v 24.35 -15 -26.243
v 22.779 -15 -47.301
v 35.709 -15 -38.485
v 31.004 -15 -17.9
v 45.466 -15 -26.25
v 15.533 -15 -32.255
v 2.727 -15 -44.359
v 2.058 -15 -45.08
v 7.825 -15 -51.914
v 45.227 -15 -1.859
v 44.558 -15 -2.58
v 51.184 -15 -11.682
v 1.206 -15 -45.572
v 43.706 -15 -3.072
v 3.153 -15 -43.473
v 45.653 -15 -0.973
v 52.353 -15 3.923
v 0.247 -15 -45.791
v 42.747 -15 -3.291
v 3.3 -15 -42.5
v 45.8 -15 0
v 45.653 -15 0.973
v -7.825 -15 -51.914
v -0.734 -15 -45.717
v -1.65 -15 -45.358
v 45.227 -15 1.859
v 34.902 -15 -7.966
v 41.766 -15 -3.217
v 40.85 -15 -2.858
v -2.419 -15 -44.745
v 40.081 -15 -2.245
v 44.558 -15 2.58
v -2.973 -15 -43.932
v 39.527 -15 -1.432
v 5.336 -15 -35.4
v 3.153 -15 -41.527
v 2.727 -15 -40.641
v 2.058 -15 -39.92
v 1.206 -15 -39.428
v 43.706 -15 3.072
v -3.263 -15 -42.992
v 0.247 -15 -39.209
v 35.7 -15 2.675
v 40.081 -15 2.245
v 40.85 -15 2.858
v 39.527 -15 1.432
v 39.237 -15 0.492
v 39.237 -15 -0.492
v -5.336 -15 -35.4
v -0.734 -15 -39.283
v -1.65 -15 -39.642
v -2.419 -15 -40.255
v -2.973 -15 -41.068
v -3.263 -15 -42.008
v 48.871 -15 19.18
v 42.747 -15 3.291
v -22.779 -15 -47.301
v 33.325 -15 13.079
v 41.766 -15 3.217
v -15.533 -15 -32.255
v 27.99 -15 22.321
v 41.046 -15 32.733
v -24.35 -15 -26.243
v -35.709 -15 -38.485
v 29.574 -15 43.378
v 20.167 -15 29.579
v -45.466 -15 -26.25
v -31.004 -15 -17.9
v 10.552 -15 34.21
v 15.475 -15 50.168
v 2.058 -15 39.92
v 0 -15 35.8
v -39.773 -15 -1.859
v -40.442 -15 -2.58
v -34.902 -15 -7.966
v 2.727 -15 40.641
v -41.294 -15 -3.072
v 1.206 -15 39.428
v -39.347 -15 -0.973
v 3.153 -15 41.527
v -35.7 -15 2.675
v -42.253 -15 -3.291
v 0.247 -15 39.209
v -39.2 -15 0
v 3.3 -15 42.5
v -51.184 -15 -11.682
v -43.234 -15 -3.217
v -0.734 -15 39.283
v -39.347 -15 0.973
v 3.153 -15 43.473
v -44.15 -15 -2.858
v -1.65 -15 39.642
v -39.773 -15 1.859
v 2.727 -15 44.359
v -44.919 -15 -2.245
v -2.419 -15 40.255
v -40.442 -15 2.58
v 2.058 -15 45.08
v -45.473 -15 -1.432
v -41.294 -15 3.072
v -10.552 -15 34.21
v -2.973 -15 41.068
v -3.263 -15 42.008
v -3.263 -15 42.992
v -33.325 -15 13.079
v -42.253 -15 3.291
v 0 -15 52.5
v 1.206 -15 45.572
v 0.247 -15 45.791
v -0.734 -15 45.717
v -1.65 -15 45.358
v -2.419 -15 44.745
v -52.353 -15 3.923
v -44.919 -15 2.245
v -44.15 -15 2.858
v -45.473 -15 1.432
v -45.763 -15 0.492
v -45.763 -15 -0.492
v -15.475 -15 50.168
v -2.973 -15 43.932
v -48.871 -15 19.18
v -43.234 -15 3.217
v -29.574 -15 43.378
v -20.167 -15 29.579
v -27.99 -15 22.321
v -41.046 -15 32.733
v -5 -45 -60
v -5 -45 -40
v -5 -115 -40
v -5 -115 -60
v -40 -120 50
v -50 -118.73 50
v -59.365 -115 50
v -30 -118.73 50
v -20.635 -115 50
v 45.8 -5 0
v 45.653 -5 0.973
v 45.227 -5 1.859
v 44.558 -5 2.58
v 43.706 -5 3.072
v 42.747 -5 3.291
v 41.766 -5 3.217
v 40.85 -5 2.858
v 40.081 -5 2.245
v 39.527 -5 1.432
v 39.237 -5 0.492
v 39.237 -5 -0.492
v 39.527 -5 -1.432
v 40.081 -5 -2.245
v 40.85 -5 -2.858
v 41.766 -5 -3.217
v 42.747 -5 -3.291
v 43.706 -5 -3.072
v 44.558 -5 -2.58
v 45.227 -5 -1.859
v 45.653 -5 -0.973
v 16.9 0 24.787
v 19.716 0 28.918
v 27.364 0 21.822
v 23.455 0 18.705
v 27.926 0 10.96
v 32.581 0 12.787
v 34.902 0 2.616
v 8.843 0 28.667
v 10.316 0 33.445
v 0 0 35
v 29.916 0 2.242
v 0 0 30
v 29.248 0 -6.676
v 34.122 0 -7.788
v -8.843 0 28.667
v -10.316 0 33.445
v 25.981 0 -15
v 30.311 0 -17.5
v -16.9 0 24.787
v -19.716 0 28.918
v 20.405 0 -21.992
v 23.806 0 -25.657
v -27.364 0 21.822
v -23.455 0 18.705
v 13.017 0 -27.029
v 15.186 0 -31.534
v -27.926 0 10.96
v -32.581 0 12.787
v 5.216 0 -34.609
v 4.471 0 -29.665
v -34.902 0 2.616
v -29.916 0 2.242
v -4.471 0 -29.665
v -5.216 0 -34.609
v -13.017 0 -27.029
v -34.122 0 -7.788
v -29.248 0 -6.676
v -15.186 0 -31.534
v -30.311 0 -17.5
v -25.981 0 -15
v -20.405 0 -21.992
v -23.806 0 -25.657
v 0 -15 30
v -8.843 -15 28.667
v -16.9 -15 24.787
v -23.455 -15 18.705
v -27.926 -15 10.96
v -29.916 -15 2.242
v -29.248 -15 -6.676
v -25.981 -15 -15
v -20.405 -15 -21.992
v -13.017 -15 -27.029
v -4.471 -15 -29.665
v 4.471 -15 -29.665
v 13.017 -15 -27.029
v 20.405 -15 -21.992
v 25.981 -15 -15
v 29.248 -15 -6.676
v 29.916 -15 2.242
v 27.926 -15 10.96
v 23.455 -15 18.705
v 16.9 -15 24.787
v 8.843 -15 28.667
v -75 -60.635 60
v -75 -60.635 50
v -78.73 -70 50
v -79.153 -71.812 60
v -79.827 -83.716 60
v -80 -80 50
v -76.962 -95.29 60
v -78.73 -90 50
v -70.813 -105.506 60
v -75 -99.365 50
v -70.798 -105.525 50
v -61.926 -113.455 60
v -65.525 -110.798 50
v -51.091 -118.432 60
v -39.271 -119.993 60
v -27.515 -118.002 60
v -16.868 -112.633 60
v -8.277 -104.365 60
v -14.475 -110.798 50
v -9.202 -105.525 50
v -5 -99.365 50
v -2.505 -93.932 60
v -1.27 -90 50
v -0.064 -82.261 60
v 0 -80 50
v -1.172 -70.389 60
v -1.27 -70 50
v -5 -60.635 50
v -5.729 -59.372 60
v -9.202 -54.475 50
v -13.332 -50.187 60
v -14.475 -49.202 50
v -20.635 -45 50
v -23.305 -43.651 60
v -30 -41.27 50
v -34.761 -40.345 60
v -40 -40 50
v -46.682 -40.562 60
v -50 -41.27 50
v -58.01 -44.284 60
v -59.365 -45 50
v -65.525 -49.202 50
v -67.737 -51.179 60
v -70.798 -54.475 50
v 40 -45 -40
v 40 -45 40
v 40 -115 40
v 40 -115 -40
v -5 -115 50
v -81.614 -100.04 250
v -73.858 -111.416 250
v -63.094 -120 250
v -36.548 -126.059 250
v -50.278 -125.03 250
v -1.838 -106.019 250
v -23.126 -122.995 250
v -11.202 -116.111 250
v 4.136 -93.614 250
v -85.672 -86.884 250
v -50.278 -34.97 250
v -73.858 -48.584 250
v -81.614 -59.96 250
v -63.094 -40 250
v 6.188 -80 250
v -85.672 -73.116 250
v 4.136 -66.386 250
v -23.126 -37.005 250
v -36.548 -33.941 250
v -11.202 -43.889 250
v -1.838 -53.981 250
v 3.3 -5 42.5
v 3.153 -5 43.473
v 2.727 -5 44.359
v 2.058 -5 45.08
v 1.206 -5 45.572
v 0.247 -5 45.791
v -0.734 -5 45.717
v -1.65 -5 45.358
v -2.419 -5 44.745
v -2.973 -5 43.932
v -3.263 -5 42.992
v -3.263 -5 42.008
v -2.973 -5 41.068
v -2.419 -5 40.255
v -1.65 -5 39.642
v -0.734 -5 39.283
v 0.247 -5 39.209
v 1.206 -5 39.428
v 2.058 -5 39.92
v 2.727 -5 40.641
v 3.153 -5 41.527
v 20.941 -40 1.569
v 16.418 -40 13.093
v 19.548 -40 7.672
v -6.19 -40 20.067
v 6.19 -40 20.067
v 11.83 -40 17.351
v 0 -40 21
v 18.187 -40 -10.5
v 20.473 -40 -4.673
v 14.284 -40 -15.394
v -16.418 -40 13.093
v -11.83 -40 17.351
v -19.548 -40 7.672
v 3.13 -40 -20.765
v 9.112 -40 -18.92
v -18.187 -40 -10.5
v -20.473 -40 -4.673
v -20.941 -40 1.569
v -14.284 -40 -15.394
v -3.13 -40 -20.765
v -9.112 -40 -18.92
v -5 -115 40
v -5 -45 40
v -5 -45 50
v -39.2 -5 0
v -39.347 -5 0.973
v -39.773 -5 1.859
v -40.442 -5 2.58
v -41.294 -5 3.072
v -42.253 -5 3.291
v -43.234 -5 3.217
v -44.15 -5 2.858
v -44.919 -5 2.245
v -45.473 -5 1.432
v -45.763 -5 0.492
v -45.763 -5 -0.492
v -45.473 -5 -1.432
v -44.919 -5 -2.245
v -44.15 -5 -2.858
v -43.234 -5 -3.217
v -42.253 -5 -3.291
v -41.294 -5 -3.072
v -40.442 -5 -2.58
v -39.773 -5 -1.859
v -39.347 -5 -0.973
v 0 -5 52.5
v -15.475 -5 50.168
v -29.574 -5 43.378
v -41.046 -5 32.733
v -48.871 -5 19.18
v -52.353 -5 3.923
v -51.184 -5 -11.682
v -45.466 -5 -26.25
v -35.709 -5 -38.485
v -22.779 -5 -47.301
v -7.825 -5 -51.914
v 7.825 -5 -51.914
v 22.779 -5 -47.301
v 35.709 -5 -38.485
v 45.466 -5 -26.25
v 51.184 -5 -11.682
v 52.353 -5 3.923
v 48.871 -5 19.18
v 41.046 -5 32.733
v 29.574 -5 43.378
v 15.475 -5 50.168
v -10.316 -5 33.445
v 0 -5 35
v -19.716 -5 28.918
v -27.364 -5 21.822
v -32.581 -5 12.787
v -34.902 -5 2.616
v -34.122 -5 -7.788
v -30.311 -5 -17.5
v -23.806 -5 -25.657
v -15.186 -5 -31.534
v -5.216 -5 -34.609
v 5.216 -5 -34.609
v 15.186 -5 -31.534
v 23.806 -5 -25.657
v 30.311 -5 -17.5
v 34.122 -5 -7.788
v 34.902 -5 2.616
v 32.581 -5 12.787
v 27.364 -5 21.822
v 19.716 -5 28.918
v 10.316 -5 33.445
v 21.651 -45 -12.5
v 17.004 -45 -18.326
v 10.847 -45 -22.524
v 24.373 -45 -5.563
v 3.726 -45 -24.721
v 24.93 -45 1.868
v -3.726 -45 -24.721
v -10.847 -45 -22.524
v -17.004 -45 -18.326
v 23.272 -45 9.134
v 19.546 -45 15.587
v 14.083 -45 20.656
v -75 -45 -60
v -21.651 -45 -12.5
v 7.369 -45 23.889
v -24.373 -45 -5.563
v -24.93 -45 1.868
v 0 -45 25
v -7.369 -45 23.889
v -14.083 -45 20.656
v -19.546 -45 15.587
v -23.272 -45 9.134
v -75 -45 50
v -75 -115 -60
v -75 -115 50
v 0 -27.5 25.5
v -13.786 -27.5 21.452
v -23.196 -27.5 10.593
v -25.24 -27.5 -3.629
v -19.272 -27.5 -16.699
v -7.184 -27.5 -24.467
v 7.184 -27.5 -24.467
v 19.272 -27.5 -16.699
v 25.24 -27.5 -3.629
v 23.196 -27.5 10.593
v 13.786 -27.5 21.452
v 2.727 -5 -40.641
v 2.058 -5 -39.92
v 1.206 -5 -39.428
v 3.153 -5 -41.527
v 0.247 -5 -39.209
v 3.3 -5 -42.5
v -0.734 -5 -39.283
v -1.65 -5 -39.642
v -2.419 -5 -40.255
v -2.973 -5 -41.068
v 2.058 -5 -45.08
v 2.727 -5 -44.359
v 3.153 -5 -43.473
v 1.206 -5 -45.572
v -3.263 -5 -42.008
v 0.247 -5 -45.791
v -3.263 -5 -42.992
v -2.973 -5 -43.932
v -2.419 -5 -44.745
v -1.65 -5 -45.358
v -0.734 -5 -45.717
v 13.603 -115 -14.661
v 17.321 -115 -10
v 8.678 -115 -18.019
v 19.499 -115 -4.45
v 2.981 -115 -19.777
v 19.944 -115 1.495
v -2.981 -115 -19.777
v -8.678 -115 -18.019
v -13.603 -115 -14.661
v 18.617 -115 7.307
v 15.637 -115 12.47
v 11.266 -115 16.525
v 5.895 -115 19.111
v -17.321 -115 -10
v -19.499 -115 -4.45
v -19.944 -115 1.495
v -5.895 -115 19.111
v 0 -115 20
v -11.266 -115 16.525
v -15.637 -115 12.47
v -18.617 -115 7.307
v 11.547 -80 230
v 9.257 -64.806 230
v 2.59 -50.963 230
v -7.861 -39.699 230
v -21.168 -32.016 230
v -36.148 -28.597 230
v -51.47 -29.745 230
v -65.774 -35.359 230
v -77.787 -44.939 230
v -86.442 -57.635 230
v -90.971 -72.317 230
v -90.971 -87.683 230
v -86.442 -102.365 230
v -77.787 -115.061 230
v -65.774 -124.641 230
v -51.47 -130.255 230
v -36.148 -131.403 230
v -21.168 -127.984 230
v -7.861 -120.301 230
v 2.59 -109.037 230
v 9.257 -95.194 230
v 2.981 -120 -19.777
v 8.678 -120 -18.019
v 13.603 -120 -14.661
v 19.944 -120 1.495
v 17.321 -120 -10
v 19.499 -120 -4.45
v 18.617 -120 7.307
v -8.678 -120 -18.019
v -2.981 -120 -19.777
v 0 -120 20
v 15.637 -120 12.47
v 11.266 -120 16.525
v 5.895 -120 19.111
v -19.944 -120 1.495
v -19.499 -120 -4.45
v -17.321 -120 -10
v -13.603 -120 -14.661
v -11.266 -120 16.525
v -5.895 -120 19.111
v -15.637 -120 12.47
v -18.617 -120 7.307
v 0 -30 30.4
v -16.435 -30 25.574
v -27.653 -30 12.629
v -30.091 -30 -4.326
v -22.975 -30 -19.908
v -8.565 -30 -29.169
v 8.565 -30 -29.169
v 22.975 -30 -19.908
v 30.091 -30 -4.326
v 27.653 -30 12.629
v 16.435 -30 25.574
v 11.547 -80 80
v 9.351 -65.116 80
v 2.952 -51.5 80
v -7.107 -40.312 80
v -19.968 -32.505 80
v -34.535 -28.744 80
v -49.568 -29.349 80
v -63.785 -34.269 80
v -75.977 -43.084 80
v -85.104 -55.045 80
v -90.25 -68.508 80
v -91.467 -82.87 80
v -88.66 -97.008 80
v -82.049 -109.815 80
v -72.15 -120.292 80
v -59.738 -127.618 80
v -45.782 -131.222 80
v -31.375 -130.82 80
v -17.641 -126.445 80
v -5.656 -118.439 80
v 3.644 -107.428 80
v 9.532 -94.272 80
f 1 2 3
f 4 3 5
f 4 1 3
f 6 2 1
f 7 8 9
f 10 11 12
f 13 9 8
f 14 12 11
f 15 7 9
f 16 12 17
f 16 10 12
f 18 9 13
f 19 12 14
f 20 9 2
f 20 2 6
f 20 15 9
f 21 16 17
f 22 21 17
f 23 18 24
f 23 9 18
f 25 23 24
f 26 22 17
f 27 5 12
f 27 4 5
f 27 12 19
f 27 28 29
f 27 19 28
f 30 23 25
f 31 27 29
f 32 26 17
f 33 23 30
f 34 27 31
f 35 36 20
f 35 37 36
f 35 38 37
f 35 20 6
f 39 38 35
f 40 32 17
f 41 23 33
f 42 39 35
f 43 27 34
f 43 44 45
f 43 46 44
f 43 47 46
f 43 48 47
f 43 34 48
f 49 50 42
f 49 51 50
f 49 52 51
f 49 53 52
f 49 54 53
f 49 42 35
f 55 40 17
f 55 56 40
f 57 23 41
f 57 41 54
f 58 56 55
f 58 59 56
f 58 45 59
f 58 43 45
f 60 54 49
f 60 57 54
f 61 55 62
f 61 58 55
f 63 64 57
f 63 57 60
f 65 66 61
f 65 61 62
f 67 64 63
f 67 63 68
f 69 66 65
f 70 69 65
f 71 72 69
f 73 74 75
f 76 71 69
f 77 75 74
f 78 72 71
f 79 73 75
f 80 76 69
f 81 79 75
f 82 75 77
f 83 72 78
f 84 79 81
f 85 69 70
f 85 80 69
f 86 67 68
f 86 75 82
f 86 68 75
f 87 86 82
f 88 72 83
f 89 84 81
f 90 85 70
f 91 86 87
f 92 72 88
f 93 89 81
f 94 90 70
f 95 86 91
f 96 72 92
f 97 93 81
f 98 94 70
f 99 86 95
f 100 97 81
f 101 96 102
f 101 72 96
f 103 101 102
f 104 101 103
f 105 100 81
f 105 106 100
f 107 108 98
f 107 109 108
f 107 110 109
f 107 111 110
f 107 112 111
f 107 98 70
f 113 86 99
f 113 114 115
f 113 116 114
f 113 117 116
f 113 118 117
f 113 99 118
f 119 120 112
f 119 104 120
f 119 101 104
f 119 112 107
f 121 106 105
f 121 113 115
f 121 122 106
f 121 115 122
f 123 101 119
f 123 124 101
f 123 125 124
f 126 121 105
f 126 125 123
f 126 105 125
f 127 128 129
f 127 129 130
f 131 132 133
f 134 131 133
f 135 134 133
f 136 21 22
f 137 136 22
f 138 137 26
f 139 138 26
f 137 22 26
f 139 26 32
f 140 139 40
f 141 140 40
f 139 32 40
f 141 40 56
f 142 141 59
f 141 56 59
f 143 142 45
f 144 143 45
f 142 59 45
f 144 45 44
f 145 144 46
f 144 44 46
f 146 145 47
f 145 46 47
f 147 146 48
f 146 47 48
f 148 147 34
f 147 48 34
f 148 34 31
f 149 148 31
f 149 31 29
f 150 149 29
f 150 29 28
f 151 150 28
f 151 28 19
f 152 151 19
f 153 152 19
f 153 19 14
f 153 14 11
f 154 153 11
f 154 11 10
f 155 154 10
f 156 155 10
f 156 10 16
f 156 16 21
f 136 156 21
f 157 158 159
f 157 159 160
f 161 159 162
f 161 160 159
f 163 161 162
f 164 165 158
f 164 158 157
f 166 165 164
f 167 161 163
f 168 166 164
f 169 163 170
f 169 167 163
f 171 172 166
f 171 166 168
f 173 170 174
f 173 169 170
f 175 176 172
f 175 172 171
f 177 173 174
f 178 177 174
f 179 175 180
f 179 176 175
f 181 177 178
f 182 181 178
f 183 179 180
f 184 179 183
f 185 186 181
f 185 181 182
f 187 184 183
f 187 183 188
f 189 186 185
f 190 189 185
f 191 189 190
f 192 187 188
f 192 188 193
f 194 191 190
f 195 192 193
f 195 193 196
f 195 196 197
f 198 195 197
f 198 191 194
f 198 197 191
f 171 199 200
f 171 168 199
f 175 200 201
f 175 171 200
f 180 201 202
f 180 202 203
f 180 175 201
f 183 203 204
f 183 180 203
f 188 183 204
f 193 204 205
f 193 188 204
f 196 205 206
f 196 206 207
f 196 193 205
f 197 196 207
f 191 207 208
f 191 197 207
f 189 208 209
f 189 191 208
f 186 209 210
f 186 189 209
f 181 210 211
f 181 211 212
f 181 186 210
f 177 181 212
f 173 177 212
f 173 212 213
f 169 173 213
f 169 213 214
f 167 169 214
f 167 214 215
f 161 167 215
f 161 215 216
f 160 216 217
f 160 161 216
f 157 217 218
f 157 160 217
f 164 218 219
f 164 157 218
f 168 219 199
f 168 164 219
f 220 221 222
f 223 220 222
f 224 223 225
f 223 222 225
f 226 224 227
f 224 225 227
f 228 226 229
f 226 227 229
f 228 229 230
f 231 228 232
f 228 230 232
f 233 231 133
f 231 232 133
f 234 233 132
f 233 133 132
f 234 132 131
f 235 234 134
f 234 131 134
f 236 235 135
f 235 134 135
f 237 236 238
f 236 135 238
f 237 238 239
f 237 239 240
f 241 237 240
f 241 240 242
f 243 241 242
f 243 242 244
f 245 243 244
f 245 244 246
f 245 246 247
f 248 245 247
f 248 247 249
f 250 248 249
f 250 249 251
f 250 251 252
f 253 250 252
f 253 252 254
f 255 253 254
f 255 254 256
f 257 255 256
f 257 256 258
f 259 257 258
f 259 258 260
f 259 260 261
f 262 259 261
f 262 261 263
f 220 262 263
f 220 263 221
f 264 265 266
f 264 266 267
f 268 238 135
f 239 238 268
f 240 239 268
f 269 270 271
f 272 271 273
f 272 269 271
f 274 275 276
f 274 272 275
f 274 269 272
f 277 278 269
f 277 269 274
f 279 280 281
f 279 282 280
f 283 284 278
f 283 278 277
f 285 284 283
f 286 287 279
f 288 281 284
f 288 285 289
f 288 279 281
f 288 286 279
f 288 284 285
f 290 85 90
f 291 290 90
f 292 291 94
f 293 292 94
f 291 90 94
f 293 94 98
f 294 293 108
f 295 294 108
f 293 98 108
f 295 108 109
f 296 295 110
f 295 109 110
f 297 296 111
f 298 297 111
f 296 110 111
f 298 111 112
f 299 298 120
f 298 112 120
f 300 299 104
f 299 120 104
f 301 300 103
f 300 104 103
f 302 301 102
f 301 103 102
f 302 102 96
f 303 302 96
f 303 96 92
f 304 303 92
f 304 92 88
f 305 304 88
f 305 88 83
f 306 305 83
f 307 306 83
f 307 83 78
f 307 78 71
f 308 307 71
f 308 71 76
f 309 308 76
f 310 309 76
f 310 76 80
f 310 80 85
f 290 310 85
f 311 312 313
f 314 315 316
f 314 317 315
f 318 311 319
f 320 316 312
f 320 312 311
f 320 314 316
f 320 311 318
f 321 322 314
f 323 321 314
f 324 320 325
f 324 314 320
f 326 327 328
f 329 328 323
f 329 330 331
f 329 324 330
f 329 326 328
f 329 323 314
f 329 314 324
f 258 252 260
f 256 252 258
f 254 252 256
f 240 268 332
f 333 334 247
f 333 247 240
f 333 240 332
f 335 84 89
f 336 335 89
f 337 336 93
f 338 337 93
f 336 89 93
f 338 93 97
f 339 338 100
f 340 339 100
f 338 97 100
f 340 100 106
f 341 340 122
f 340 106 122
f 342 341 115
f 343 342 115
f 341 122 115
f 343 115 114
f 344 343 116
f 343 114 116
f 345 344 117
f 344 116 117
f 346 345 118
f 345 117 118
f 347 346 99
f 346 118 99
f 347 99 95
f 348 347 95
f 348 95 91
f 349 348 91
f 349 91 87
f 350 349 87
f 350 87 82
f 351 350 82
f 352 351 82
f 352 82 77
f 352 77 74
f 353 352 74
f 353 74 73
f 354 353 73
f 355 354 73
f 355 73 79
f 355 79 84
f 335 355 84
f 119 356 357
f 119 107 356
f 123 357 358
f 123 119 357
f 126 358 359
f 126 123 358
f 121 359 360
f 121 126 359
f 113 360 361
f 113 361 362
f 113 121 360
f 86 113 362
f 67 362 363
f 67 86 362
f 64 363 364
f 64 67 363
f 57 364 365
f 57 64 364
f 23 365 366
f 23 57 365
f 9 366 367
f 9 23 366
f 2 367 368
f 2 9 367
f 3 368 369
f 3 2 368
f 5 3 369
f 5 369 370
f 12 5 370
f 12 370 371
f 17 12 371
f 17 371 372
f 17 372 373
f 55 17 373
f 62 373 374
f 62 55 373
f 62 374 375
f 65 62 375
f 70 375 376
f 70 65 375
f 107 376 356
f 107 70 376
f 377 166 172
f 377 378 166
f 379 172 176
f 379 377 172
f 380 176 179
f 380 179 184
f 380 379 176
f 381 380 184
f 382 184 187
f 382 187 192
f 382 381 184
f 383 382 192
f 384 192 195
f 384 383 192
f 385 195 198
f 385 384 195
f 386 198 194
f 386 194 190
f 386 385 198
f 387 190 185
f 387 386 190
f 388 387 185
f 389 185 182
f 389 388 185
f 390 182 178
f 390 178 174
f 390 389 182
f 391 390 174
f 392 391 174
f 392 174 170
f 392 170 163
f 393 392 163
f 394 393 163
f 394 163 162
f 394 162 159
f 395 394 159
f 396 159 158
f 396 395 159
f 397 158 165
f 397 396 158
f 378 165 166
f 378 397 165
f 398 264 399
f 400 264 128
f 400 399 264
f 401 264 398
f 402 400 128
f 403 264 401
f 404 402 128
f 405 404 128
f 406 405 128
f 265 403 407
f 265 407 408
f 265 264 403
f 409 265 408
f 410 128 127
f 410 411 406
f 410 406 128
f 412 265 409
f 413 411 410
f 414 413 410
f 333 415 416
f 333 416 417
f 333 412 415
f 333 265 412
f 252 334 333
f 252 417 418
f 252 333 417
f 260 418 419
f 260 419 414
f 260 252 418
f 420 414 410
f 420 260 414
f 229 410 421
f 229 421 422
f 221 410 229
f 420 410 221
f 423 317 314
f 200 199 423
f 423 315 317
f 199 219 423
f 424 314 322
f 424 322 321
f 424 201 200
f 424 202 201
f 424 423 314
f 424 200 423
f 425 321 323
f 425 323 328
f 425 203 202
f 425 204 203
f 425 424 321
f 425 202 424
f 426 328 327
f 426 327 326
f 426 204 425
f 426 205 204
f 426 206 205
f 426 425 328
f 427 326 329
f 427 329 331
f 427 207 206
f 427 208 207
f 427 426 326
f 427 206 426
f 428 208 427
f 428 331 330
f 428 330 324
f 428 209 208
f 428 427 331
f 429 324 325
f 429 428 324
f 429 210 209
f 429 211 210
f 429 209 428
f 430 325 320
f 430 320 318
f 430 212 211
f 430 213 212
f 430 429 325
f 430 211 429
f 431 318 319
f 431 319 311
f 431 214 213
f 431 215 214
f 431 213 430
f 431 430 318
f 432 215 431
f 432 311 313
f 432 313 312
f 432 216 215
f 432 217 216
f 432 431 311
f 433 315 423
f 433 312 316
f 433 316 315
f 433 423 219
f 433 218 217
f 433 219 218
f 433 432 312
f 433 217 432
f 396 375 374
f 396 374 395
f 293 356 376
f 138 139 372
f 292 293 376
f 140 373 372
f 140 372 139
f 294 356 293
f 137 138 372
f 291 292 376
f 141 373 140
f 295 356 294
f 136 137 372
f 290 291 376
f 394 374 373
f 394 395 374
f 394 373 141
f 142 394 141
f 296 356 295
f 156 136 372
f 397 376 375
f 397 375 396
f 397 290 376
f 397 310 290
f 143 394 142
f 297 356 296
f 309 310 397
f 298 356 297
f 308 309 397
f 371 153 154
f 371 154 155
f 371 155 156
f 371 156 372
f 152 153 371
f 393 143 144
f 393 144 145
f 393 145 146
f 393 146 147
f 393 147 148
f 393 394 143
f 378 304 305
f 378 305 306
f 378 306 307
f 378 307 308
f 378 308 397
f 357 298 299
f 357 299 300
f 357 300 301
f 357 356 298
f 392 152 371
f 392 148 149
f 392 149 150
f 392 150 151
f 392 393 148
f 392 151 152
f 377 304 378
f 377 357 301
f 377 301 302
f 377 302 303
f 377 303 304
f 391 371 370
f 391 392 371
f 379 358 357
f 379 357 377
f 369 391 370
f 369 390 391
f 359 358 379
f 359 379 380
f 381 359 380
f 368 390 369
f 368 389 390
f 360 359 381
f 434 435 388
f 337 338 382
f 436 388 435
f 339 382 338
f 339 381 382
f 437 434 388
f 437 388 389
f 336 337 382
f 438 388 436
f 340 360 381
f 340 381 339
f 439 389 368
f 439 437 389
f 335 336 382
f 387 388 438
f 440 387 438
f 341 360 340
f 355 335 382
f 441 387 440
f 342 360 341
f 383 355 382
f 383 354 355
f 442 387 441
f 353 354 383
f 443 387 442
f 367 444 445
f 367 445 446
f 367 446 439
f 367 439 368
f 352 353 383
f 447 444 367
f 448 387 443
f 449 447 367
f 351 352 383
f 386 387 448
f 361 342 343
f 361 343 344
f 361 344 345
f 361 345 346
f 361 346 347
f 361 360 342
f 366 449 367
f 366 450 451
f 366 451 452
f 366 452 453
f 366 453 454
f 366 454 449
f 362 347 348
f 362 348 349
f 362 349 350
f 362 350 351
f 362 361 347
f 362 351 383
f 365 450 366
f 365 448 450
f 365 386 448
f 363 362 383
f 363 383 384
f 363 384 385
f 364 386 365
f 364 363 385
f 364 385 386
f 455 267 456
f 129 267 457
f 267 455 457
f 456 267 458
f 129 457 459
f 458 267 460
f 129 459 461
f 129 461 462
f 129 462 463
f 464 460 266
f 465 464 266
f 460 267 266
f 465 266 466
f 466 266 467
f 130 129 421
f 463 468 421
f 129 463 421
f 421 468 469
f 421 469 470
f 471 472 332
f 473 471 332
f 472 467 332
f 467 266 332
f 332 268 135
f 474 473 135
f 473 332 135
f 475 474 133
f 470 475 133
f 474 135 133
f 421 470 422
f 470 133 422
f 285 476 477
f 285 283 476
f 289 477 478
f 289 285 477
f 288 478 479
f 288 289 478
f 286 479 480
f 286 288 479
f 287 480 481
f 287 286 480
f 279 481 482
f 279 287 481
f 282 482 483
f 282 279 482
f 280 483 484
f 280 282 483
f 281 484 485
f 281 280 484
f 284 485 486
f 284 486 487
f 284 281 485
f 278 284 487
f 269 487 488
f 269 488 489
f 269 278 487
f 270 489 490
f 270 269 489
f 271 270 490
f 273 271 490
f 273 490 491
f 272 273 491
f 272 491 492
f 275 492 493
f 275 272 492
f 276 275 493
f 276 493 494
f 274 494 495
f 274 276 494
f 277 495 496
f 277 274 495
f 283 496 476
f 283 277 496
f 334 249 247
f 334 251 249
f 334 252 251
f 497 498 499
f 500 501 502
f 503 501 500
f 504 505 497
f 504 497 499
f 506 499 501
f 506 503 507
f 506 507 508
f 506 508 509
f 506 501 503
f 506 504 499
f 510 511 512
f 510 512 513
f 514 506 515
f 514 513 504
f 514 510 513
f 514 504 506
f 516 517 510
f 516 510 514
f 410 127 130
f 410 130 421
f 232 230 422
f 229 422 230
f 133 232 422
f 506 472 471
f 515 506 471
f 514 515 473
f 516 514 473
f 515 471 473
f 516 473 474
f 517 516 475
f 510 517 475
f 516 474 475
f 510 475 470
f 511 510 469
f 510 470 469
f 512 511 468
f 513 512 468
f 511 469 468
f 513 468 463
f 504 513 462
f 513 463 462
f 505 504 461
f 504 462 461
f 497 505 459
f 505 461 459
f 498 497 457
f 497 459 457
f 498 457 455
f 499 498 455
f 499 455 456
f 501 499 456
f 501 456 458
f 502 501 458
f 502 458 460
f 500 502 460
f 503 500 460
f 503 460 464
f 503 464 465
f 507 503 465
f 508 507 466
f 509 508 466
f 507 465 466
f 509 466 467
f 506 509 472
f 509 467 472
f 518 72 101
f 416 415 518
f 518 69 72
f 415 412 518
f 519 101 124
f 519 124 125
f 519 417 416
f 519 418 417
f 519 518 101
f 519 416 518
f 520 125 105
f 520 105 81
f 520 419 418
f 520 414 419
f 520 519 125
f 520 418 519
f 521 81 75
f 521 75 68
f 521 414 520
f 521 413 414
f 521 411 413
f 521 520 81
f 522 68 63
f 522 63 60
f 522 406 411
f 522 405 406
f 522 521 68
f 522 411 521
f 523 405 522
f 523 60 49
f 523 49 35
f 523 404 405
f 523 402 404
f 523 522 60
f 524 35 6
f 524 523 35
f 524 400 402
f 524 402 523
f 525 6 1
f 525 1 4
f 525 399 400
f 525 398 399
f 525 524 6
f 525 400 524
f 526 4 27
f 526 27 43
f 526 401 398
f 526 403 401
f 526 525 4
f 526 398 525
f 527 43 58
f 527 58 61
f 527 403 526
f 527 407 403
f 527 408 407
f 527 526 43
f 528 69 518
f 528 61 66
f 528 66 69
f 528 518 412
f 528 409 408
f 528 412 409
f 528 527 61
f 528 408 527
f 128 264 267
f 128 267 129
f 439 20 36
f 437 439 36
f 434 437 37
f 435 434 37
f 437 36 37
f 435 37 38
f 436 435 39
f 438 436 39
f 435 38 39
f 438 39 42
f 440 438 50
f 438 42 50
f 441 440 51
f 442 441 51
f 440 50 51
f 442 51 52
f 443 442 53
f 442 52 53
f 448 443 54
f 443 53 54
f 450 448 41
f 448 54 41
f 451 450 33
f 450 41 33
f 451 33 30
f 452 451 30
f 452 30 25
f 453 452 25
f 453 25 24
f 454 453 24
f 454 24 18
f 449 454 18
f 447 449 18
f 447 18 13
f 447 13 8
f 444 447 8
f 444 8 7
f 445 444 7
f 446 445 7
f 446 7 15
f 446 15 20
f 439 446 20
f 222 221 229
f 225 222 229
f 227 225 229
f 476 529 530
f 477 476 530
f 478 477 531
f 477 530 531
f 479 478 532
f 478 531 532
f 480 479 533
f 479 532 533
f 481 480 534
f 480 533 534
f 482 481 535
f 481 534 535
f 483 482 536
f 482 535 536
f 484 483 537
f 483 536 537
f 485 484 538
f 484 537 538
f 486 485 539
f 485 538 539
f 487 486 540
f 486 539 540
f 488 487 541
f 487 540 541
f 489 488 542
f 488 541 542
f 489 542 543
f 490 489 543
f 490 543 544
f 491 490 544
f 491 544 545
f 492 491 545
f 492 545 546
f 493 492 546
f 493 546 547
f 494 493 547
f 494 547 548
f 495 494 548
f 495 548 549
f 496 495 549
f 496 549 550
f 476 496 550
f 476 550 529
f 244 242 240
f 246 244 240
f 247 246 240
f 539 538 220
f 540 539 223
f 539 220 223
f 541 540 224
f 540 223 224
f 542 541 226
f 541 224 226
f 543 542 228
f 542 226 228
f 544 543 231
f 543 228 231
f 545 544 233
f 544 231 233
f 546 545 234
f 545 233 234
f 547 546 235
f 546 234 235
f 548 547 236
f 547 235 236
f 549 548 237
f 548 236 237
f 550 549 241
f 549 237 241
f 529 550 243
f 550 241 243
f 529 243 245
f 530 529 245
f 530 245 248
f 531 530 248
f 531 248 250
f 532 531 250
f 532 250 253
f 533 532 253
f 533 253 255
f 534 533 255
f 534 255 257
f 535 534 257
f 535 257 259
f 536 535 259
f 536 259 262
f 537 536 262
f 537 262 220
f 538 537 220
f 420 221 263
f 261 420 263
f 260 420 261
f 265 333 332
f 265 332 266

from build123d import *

# Parameters (mm, degrees)
PER_AGE1_D         = 6.6
BOSS_EXTRU_1_DEPTH = 70
ESQUISSE6_R        = 40
BOSS_EXTRU_2_DEPTH = 10
ESQUISSE7_R        = 40
BOSS_EXTRU_3_DEPTH = 20
BOSS_EXTRU_3_DRAFT = -30
ESQUISSE8_R        = 51.547005384
BOSS_EXTRU_4_DEPTH = 150
ESQUISSE9_R        = 51.547005384
BOSS_EXTRU_5_DEPTH = 20
BOSS_EXTRU_5_TAPER = 15
ESQUISSE10_R       = 20
BOSS_EXTRU_6_DEPTH = 5


with BuildPart() as part:
    # Esquisse1 → Base-Révolution (revolve)
    with BuildSketch(Plane.XY, mode=Mode.PRIVATE) as base_r_volution_sk:
        Polygon((30, 0), (35, 0), (35, -5), (52.5, -5), (52.5, -15), (35.8, -15), (25, -45), (0, -45), (0, -40), (21, -40), (30, -15), align=None)
    revolve(base_r_volution_sk.sketch.rotate(Axis((0, 32.384217016, 0), (0, -1, 0)), 90), axis=Axis((0, 32.384217016, 0), (0, -1, 0)))

    # Perçage1 (through all)
    with Locations(Plane(origin=(0, -5, 0), x_dir=(-1, 0, 0), z_dir=(0, 1, 0))):
        with Locations((42.5, 0), (-42.5, 0), (0, -42.5), (0, 42.5)):
            Hole(PER_AGE1_D / 2)

    # Esquisse2 → Boss.-Extru.1 (add)
    with BuildSketch(Plane.XZ.offset(45)):
        Polygon((-5, -40), (-5, -60), (-75, -60), (-75, 50), (-5, 50), (-5, 40), (40, 40), (40, -40), align=None)
    extrude(amount=BOSS_EXTRU_1_DEPTH)

    # Esquisse6 → Boss.-Extru.2 (add)
    with BuildSketch(Plane.XY.offset(50)):
        with Locations(Location((-40, -80, 0), (0, 0, 151.044975628))):
            Circle(ESQUISSE6_R)
    extrude(amount=BOSS_EXTRU_2_DEPTH)


with BuildPart() as boss_extru_3_tool:
    # Esquisse7 → Boss.-Extru.3 (with draft: the straight prism first)
    with BuildSketch(Plane.XY.offset(60)):
        with Locations(Location((-40, -80, 0), (0, 0, 151.044975628))):
            Circle(ESQUISSE7_R)
    extrude(amount=BOSS_EXTRU_3_DEPTH)
    # Boss.-Extru.3: the draft: its side faces are tilted about the plane it starts from
    boss_extru_3_sides = [boss_extru_3_tool.faces().sort_by_distance(p)[0] for p in [
        (-5, -99.364916731, 70),
    ]]
    draft(boss_extru_3_sides, Plane.XY.offset(60), BOSS_EXTRU_3_DRAFT)


with BuildPart() as part_1:
    add(part.part)

    # Boss.-Extru.3: add boss_extru_3_tool
    add(boss_extru_3_tool.part)

    # Esquisse8 → Boss.-Extru.4 (add)
    with BuildSketch(Plane.XY.offset(80)):
        with Locations((-40, -80)):
            Circle(ESQUISSE8_R)
    extrude(amount=BOSS_EXTRU_4_DEPTH)

    # Esquisse9 → Boss.-Extru.5 (add)
    with BuildSketch(Plane.XY.offset(230)):
        with Locations((-40, -80)):
            Circle(ESQUISSE9_R)
    extrude(amount=BOSS_EXTRU_5_DEPTH, taper=BOSS_EXTRU_5_TAPER)

    # Esquisse10 → Boss.-Extru.6 (add)
    with BuildSketch(Plane.XZ.offset(115)):
        with Locations(Location((0, 0, 0), (0, 0, 90))):
            Circle(ESQUISSE10_R)
    extrude(amount=BOSS_EXTRU_6_DEPTH)


solid = part_1.part
